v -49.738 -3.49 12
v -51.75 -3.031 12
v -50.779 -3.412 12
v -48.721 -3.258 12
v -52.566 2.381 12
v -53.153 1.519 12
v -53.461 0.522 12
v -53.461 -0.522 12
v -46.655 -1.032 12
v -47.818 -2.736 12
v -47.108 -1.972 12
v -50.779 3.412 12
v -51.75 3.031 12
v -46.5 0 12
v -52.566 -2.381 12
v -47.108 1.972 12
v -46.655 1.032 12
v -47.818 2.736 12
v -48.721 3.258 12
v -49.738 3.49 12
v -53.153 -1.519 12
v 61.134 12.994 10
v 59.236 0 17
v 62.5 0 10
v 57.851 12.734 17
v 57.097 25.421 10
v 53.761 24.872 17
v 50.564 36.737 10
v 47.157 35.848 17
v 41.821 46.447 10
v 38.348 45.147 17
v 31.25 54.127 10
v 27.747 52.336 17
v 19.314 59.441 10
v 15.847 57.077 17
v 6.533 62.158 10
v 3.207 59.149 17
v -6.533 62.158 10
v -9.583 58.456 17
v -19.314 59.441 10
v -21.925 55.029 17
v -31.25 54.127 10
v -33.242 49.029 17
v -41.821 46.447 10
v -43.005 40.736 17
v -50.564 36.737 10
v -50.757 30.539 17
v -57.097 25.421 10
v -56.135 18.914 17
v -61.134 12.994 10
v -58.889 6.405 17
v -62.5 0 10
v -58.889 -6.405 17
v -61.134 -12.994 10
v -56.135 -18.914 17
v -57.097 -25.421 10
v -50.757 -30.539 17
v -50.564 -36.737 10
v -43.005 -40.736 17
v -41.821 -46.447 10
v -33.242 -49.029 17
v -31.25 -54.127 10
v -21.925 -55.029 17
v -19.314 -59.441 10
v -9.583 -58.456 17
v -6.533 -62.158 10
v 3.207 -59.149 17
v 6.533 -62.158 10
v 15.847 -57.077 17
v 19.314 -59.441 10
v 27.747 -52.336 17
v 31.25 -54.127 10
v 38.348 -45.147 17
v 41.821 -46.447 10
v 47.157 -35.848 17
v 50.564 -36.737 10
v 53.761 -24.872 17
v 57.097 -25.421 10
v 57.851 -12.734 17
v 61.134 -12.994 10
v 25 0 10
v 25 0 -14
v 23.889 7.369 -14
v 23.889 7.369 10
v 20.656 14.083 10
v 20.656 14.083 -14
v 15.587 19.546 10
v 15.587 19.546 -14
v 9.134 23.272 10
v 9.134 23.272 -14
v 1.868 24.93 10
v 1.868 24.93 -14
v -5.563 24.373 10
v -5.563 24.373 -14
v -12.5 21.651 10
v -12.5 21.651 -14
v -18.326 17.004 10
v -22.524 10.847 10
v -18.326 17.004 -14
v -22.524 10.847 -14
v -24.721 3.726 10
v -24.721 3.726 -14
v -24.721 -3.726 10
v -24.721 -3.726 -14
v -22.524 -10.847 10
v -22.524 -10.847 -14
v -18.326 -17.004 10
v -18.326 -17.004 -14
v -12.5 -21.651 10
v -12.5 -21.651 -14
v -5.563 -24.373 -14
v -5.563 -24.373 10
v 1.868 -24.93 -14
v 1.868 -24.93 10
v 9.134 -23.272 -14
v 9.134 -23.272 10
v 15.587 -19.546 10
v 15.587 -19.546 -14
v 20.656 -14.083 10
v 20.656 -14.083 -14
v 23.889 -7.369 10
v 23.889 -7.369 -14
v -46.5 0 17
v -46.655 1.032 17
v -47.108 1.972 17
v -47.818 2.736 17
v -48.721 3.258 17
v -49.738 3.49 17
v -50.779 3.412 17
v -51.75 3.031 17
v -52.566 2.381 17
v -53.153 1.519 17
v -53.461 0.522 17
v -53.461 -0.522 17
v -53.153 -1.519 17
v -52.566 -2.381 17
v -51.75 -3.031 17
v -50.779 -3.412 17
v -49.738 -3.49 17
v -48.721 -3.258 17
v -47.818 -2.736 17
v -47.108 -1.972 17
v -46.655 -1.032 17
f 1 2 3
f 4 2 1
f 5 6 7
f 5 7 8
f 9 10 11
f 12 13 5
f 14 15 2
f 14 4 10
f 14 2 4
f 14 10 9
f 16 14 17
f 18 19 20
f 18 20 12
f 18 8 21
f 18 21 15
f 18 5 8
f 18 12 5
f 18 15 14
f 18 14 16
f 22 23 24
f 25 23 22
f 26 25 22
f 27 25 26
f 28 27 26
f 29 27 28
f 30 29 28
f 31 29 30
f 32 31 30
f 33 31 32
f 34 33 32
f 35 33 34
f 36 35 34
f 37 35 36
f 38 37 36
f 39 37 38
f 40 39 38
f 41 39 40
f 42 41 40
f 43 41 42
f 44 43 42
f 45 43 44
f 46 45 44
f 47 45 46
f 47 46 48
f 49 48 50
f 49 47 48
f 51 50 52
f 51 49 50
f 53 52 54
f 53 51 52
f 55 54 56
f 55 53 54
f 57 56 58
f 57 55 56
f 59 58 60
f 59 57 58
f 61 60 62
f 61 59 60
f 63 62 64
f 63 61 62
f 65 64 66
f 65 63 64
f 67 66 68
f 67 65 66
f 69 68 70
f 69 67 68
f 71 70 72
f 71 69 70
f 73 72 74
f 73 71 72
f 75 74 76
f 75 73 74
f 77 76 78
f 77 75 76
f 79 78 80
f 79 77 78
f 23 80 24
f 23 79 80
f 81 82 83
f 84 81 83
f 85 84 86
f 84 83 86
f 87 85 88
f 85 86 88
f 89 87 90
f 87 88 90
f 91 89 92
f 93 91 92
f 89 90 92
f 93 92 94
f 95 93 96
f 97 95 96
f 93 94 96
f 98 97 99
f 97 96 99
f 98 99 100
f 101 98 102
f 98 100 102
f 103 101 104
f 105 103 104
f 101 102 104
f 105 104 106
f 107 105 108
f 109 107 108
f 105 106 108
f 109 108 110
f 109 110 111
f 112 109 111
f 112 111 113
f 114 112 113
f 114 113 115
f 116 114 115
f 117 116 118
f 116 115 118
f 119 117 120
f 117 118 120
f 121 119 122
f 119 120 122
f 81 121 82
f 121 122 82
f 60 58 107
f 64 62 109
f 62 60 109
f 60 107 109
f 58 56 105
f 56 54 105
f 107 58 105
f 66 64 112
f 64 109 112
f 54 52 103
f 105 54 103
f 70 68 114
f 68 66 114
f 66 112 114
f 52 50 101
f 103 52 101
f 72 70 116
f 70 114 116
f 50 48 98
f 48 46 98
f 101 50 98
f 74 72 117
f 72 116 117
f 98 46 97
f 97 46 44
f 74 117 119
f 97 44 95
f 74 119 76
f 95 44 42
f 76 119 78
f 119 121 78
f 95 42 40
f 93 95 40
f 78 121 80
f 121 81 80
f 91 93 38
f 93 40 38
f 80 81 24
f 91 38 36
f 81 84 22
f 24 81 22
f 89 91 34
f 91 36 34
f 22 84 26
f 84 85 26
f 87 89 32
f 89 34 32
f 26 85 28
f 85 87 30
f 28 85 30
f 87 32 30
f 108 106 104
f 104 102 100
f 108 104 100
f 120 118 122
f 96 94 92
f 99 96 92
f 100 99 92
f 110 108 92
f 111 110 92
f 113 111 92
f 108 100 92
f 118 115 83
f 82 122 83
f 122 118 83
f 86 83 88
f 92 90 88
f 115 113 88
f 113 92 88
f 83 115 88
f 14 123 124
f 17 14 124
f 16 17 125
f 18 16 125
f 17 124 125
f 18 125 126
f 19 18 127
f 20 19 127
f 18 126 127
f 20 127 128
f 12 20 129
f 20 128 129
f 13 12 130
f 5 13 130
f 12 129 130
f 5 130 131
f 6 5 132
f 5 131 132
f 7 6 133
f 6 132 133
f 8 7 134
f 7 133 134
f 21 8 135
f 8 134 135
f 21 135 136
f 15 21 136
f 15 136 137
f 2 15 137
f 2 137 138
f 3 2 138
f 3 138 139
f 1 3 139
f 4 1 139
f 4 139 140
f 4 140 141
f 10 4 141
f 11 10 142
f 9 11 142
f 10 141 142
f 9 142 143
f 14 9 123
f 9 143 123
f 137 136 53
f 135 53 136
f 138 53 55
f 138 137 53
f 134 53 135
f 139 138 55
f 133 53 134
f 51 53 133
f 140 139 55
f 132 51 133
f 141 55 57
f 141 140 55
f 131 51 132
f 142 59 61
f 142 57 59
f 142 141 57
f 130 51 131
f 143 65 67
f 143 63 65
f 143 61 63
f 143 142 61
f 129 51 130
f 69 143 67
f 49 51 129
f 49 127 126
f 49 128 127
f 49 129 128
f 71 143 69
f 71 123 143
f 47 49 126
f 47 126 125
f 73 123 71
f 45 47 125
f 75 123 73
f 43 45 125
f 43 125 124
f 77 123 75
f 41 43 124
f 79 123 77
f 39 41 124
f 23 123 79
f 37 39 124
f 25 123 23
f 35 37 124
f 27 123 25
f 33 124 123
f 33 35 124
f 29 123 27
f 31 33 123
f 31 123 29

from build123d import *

# Parameters (mm, degrees)
BOSS_EXTRUDE2_DEPTH      = 10
BOSS_EXTRUDE2_DEPTH_BACK = 14
SKETCH2_R                = 25
SKETCH4_R                = 62.5
BOSS_EXTRUDE3_DEPTH      = 7
BOSS_EXTRUDE3_TAPER      = 25
SKETCH6_R                = 3.5
CUT_EXTRUDE2_DEPTH       = 5


with BuildPart() as part:
    # Sketch2 → Boss-Extrude2 (new, two sides: drawn at the far end of the back side and taken through both)
    with BuildSketch(Plane.XY.offset(-BOSS_EXTRUDE2_DEPTH_BACK)):
        Circle(SKETCH2_R)
    extrude(amount=BOSS_EXTRUDE2_DEPTH + BOSS_EXTRUDE2_DEPTH_BACK)

    # Sketch4 → Boss-Extrude3 (add)
    with BuildSketch(Plane.XY.offset(10)):
        Circle(SKETCH4_R)
    extrude(amount=BOSS_EXTRUDE3_DEPTH, taper=BOSS_EXTRUDE3_TAPER)

    # Sketch6 → Cut-Extrude2 (cut)
    with BuildSketch(Plane.XY.offset(17)):
        with Locations((-50, 0)):
            Circle(SKETCH6_R)
    extrude(amount=-CUT_EXTRUDE2_DEPTH, mode=Mode.SUBTRACT)


solid = part.part
